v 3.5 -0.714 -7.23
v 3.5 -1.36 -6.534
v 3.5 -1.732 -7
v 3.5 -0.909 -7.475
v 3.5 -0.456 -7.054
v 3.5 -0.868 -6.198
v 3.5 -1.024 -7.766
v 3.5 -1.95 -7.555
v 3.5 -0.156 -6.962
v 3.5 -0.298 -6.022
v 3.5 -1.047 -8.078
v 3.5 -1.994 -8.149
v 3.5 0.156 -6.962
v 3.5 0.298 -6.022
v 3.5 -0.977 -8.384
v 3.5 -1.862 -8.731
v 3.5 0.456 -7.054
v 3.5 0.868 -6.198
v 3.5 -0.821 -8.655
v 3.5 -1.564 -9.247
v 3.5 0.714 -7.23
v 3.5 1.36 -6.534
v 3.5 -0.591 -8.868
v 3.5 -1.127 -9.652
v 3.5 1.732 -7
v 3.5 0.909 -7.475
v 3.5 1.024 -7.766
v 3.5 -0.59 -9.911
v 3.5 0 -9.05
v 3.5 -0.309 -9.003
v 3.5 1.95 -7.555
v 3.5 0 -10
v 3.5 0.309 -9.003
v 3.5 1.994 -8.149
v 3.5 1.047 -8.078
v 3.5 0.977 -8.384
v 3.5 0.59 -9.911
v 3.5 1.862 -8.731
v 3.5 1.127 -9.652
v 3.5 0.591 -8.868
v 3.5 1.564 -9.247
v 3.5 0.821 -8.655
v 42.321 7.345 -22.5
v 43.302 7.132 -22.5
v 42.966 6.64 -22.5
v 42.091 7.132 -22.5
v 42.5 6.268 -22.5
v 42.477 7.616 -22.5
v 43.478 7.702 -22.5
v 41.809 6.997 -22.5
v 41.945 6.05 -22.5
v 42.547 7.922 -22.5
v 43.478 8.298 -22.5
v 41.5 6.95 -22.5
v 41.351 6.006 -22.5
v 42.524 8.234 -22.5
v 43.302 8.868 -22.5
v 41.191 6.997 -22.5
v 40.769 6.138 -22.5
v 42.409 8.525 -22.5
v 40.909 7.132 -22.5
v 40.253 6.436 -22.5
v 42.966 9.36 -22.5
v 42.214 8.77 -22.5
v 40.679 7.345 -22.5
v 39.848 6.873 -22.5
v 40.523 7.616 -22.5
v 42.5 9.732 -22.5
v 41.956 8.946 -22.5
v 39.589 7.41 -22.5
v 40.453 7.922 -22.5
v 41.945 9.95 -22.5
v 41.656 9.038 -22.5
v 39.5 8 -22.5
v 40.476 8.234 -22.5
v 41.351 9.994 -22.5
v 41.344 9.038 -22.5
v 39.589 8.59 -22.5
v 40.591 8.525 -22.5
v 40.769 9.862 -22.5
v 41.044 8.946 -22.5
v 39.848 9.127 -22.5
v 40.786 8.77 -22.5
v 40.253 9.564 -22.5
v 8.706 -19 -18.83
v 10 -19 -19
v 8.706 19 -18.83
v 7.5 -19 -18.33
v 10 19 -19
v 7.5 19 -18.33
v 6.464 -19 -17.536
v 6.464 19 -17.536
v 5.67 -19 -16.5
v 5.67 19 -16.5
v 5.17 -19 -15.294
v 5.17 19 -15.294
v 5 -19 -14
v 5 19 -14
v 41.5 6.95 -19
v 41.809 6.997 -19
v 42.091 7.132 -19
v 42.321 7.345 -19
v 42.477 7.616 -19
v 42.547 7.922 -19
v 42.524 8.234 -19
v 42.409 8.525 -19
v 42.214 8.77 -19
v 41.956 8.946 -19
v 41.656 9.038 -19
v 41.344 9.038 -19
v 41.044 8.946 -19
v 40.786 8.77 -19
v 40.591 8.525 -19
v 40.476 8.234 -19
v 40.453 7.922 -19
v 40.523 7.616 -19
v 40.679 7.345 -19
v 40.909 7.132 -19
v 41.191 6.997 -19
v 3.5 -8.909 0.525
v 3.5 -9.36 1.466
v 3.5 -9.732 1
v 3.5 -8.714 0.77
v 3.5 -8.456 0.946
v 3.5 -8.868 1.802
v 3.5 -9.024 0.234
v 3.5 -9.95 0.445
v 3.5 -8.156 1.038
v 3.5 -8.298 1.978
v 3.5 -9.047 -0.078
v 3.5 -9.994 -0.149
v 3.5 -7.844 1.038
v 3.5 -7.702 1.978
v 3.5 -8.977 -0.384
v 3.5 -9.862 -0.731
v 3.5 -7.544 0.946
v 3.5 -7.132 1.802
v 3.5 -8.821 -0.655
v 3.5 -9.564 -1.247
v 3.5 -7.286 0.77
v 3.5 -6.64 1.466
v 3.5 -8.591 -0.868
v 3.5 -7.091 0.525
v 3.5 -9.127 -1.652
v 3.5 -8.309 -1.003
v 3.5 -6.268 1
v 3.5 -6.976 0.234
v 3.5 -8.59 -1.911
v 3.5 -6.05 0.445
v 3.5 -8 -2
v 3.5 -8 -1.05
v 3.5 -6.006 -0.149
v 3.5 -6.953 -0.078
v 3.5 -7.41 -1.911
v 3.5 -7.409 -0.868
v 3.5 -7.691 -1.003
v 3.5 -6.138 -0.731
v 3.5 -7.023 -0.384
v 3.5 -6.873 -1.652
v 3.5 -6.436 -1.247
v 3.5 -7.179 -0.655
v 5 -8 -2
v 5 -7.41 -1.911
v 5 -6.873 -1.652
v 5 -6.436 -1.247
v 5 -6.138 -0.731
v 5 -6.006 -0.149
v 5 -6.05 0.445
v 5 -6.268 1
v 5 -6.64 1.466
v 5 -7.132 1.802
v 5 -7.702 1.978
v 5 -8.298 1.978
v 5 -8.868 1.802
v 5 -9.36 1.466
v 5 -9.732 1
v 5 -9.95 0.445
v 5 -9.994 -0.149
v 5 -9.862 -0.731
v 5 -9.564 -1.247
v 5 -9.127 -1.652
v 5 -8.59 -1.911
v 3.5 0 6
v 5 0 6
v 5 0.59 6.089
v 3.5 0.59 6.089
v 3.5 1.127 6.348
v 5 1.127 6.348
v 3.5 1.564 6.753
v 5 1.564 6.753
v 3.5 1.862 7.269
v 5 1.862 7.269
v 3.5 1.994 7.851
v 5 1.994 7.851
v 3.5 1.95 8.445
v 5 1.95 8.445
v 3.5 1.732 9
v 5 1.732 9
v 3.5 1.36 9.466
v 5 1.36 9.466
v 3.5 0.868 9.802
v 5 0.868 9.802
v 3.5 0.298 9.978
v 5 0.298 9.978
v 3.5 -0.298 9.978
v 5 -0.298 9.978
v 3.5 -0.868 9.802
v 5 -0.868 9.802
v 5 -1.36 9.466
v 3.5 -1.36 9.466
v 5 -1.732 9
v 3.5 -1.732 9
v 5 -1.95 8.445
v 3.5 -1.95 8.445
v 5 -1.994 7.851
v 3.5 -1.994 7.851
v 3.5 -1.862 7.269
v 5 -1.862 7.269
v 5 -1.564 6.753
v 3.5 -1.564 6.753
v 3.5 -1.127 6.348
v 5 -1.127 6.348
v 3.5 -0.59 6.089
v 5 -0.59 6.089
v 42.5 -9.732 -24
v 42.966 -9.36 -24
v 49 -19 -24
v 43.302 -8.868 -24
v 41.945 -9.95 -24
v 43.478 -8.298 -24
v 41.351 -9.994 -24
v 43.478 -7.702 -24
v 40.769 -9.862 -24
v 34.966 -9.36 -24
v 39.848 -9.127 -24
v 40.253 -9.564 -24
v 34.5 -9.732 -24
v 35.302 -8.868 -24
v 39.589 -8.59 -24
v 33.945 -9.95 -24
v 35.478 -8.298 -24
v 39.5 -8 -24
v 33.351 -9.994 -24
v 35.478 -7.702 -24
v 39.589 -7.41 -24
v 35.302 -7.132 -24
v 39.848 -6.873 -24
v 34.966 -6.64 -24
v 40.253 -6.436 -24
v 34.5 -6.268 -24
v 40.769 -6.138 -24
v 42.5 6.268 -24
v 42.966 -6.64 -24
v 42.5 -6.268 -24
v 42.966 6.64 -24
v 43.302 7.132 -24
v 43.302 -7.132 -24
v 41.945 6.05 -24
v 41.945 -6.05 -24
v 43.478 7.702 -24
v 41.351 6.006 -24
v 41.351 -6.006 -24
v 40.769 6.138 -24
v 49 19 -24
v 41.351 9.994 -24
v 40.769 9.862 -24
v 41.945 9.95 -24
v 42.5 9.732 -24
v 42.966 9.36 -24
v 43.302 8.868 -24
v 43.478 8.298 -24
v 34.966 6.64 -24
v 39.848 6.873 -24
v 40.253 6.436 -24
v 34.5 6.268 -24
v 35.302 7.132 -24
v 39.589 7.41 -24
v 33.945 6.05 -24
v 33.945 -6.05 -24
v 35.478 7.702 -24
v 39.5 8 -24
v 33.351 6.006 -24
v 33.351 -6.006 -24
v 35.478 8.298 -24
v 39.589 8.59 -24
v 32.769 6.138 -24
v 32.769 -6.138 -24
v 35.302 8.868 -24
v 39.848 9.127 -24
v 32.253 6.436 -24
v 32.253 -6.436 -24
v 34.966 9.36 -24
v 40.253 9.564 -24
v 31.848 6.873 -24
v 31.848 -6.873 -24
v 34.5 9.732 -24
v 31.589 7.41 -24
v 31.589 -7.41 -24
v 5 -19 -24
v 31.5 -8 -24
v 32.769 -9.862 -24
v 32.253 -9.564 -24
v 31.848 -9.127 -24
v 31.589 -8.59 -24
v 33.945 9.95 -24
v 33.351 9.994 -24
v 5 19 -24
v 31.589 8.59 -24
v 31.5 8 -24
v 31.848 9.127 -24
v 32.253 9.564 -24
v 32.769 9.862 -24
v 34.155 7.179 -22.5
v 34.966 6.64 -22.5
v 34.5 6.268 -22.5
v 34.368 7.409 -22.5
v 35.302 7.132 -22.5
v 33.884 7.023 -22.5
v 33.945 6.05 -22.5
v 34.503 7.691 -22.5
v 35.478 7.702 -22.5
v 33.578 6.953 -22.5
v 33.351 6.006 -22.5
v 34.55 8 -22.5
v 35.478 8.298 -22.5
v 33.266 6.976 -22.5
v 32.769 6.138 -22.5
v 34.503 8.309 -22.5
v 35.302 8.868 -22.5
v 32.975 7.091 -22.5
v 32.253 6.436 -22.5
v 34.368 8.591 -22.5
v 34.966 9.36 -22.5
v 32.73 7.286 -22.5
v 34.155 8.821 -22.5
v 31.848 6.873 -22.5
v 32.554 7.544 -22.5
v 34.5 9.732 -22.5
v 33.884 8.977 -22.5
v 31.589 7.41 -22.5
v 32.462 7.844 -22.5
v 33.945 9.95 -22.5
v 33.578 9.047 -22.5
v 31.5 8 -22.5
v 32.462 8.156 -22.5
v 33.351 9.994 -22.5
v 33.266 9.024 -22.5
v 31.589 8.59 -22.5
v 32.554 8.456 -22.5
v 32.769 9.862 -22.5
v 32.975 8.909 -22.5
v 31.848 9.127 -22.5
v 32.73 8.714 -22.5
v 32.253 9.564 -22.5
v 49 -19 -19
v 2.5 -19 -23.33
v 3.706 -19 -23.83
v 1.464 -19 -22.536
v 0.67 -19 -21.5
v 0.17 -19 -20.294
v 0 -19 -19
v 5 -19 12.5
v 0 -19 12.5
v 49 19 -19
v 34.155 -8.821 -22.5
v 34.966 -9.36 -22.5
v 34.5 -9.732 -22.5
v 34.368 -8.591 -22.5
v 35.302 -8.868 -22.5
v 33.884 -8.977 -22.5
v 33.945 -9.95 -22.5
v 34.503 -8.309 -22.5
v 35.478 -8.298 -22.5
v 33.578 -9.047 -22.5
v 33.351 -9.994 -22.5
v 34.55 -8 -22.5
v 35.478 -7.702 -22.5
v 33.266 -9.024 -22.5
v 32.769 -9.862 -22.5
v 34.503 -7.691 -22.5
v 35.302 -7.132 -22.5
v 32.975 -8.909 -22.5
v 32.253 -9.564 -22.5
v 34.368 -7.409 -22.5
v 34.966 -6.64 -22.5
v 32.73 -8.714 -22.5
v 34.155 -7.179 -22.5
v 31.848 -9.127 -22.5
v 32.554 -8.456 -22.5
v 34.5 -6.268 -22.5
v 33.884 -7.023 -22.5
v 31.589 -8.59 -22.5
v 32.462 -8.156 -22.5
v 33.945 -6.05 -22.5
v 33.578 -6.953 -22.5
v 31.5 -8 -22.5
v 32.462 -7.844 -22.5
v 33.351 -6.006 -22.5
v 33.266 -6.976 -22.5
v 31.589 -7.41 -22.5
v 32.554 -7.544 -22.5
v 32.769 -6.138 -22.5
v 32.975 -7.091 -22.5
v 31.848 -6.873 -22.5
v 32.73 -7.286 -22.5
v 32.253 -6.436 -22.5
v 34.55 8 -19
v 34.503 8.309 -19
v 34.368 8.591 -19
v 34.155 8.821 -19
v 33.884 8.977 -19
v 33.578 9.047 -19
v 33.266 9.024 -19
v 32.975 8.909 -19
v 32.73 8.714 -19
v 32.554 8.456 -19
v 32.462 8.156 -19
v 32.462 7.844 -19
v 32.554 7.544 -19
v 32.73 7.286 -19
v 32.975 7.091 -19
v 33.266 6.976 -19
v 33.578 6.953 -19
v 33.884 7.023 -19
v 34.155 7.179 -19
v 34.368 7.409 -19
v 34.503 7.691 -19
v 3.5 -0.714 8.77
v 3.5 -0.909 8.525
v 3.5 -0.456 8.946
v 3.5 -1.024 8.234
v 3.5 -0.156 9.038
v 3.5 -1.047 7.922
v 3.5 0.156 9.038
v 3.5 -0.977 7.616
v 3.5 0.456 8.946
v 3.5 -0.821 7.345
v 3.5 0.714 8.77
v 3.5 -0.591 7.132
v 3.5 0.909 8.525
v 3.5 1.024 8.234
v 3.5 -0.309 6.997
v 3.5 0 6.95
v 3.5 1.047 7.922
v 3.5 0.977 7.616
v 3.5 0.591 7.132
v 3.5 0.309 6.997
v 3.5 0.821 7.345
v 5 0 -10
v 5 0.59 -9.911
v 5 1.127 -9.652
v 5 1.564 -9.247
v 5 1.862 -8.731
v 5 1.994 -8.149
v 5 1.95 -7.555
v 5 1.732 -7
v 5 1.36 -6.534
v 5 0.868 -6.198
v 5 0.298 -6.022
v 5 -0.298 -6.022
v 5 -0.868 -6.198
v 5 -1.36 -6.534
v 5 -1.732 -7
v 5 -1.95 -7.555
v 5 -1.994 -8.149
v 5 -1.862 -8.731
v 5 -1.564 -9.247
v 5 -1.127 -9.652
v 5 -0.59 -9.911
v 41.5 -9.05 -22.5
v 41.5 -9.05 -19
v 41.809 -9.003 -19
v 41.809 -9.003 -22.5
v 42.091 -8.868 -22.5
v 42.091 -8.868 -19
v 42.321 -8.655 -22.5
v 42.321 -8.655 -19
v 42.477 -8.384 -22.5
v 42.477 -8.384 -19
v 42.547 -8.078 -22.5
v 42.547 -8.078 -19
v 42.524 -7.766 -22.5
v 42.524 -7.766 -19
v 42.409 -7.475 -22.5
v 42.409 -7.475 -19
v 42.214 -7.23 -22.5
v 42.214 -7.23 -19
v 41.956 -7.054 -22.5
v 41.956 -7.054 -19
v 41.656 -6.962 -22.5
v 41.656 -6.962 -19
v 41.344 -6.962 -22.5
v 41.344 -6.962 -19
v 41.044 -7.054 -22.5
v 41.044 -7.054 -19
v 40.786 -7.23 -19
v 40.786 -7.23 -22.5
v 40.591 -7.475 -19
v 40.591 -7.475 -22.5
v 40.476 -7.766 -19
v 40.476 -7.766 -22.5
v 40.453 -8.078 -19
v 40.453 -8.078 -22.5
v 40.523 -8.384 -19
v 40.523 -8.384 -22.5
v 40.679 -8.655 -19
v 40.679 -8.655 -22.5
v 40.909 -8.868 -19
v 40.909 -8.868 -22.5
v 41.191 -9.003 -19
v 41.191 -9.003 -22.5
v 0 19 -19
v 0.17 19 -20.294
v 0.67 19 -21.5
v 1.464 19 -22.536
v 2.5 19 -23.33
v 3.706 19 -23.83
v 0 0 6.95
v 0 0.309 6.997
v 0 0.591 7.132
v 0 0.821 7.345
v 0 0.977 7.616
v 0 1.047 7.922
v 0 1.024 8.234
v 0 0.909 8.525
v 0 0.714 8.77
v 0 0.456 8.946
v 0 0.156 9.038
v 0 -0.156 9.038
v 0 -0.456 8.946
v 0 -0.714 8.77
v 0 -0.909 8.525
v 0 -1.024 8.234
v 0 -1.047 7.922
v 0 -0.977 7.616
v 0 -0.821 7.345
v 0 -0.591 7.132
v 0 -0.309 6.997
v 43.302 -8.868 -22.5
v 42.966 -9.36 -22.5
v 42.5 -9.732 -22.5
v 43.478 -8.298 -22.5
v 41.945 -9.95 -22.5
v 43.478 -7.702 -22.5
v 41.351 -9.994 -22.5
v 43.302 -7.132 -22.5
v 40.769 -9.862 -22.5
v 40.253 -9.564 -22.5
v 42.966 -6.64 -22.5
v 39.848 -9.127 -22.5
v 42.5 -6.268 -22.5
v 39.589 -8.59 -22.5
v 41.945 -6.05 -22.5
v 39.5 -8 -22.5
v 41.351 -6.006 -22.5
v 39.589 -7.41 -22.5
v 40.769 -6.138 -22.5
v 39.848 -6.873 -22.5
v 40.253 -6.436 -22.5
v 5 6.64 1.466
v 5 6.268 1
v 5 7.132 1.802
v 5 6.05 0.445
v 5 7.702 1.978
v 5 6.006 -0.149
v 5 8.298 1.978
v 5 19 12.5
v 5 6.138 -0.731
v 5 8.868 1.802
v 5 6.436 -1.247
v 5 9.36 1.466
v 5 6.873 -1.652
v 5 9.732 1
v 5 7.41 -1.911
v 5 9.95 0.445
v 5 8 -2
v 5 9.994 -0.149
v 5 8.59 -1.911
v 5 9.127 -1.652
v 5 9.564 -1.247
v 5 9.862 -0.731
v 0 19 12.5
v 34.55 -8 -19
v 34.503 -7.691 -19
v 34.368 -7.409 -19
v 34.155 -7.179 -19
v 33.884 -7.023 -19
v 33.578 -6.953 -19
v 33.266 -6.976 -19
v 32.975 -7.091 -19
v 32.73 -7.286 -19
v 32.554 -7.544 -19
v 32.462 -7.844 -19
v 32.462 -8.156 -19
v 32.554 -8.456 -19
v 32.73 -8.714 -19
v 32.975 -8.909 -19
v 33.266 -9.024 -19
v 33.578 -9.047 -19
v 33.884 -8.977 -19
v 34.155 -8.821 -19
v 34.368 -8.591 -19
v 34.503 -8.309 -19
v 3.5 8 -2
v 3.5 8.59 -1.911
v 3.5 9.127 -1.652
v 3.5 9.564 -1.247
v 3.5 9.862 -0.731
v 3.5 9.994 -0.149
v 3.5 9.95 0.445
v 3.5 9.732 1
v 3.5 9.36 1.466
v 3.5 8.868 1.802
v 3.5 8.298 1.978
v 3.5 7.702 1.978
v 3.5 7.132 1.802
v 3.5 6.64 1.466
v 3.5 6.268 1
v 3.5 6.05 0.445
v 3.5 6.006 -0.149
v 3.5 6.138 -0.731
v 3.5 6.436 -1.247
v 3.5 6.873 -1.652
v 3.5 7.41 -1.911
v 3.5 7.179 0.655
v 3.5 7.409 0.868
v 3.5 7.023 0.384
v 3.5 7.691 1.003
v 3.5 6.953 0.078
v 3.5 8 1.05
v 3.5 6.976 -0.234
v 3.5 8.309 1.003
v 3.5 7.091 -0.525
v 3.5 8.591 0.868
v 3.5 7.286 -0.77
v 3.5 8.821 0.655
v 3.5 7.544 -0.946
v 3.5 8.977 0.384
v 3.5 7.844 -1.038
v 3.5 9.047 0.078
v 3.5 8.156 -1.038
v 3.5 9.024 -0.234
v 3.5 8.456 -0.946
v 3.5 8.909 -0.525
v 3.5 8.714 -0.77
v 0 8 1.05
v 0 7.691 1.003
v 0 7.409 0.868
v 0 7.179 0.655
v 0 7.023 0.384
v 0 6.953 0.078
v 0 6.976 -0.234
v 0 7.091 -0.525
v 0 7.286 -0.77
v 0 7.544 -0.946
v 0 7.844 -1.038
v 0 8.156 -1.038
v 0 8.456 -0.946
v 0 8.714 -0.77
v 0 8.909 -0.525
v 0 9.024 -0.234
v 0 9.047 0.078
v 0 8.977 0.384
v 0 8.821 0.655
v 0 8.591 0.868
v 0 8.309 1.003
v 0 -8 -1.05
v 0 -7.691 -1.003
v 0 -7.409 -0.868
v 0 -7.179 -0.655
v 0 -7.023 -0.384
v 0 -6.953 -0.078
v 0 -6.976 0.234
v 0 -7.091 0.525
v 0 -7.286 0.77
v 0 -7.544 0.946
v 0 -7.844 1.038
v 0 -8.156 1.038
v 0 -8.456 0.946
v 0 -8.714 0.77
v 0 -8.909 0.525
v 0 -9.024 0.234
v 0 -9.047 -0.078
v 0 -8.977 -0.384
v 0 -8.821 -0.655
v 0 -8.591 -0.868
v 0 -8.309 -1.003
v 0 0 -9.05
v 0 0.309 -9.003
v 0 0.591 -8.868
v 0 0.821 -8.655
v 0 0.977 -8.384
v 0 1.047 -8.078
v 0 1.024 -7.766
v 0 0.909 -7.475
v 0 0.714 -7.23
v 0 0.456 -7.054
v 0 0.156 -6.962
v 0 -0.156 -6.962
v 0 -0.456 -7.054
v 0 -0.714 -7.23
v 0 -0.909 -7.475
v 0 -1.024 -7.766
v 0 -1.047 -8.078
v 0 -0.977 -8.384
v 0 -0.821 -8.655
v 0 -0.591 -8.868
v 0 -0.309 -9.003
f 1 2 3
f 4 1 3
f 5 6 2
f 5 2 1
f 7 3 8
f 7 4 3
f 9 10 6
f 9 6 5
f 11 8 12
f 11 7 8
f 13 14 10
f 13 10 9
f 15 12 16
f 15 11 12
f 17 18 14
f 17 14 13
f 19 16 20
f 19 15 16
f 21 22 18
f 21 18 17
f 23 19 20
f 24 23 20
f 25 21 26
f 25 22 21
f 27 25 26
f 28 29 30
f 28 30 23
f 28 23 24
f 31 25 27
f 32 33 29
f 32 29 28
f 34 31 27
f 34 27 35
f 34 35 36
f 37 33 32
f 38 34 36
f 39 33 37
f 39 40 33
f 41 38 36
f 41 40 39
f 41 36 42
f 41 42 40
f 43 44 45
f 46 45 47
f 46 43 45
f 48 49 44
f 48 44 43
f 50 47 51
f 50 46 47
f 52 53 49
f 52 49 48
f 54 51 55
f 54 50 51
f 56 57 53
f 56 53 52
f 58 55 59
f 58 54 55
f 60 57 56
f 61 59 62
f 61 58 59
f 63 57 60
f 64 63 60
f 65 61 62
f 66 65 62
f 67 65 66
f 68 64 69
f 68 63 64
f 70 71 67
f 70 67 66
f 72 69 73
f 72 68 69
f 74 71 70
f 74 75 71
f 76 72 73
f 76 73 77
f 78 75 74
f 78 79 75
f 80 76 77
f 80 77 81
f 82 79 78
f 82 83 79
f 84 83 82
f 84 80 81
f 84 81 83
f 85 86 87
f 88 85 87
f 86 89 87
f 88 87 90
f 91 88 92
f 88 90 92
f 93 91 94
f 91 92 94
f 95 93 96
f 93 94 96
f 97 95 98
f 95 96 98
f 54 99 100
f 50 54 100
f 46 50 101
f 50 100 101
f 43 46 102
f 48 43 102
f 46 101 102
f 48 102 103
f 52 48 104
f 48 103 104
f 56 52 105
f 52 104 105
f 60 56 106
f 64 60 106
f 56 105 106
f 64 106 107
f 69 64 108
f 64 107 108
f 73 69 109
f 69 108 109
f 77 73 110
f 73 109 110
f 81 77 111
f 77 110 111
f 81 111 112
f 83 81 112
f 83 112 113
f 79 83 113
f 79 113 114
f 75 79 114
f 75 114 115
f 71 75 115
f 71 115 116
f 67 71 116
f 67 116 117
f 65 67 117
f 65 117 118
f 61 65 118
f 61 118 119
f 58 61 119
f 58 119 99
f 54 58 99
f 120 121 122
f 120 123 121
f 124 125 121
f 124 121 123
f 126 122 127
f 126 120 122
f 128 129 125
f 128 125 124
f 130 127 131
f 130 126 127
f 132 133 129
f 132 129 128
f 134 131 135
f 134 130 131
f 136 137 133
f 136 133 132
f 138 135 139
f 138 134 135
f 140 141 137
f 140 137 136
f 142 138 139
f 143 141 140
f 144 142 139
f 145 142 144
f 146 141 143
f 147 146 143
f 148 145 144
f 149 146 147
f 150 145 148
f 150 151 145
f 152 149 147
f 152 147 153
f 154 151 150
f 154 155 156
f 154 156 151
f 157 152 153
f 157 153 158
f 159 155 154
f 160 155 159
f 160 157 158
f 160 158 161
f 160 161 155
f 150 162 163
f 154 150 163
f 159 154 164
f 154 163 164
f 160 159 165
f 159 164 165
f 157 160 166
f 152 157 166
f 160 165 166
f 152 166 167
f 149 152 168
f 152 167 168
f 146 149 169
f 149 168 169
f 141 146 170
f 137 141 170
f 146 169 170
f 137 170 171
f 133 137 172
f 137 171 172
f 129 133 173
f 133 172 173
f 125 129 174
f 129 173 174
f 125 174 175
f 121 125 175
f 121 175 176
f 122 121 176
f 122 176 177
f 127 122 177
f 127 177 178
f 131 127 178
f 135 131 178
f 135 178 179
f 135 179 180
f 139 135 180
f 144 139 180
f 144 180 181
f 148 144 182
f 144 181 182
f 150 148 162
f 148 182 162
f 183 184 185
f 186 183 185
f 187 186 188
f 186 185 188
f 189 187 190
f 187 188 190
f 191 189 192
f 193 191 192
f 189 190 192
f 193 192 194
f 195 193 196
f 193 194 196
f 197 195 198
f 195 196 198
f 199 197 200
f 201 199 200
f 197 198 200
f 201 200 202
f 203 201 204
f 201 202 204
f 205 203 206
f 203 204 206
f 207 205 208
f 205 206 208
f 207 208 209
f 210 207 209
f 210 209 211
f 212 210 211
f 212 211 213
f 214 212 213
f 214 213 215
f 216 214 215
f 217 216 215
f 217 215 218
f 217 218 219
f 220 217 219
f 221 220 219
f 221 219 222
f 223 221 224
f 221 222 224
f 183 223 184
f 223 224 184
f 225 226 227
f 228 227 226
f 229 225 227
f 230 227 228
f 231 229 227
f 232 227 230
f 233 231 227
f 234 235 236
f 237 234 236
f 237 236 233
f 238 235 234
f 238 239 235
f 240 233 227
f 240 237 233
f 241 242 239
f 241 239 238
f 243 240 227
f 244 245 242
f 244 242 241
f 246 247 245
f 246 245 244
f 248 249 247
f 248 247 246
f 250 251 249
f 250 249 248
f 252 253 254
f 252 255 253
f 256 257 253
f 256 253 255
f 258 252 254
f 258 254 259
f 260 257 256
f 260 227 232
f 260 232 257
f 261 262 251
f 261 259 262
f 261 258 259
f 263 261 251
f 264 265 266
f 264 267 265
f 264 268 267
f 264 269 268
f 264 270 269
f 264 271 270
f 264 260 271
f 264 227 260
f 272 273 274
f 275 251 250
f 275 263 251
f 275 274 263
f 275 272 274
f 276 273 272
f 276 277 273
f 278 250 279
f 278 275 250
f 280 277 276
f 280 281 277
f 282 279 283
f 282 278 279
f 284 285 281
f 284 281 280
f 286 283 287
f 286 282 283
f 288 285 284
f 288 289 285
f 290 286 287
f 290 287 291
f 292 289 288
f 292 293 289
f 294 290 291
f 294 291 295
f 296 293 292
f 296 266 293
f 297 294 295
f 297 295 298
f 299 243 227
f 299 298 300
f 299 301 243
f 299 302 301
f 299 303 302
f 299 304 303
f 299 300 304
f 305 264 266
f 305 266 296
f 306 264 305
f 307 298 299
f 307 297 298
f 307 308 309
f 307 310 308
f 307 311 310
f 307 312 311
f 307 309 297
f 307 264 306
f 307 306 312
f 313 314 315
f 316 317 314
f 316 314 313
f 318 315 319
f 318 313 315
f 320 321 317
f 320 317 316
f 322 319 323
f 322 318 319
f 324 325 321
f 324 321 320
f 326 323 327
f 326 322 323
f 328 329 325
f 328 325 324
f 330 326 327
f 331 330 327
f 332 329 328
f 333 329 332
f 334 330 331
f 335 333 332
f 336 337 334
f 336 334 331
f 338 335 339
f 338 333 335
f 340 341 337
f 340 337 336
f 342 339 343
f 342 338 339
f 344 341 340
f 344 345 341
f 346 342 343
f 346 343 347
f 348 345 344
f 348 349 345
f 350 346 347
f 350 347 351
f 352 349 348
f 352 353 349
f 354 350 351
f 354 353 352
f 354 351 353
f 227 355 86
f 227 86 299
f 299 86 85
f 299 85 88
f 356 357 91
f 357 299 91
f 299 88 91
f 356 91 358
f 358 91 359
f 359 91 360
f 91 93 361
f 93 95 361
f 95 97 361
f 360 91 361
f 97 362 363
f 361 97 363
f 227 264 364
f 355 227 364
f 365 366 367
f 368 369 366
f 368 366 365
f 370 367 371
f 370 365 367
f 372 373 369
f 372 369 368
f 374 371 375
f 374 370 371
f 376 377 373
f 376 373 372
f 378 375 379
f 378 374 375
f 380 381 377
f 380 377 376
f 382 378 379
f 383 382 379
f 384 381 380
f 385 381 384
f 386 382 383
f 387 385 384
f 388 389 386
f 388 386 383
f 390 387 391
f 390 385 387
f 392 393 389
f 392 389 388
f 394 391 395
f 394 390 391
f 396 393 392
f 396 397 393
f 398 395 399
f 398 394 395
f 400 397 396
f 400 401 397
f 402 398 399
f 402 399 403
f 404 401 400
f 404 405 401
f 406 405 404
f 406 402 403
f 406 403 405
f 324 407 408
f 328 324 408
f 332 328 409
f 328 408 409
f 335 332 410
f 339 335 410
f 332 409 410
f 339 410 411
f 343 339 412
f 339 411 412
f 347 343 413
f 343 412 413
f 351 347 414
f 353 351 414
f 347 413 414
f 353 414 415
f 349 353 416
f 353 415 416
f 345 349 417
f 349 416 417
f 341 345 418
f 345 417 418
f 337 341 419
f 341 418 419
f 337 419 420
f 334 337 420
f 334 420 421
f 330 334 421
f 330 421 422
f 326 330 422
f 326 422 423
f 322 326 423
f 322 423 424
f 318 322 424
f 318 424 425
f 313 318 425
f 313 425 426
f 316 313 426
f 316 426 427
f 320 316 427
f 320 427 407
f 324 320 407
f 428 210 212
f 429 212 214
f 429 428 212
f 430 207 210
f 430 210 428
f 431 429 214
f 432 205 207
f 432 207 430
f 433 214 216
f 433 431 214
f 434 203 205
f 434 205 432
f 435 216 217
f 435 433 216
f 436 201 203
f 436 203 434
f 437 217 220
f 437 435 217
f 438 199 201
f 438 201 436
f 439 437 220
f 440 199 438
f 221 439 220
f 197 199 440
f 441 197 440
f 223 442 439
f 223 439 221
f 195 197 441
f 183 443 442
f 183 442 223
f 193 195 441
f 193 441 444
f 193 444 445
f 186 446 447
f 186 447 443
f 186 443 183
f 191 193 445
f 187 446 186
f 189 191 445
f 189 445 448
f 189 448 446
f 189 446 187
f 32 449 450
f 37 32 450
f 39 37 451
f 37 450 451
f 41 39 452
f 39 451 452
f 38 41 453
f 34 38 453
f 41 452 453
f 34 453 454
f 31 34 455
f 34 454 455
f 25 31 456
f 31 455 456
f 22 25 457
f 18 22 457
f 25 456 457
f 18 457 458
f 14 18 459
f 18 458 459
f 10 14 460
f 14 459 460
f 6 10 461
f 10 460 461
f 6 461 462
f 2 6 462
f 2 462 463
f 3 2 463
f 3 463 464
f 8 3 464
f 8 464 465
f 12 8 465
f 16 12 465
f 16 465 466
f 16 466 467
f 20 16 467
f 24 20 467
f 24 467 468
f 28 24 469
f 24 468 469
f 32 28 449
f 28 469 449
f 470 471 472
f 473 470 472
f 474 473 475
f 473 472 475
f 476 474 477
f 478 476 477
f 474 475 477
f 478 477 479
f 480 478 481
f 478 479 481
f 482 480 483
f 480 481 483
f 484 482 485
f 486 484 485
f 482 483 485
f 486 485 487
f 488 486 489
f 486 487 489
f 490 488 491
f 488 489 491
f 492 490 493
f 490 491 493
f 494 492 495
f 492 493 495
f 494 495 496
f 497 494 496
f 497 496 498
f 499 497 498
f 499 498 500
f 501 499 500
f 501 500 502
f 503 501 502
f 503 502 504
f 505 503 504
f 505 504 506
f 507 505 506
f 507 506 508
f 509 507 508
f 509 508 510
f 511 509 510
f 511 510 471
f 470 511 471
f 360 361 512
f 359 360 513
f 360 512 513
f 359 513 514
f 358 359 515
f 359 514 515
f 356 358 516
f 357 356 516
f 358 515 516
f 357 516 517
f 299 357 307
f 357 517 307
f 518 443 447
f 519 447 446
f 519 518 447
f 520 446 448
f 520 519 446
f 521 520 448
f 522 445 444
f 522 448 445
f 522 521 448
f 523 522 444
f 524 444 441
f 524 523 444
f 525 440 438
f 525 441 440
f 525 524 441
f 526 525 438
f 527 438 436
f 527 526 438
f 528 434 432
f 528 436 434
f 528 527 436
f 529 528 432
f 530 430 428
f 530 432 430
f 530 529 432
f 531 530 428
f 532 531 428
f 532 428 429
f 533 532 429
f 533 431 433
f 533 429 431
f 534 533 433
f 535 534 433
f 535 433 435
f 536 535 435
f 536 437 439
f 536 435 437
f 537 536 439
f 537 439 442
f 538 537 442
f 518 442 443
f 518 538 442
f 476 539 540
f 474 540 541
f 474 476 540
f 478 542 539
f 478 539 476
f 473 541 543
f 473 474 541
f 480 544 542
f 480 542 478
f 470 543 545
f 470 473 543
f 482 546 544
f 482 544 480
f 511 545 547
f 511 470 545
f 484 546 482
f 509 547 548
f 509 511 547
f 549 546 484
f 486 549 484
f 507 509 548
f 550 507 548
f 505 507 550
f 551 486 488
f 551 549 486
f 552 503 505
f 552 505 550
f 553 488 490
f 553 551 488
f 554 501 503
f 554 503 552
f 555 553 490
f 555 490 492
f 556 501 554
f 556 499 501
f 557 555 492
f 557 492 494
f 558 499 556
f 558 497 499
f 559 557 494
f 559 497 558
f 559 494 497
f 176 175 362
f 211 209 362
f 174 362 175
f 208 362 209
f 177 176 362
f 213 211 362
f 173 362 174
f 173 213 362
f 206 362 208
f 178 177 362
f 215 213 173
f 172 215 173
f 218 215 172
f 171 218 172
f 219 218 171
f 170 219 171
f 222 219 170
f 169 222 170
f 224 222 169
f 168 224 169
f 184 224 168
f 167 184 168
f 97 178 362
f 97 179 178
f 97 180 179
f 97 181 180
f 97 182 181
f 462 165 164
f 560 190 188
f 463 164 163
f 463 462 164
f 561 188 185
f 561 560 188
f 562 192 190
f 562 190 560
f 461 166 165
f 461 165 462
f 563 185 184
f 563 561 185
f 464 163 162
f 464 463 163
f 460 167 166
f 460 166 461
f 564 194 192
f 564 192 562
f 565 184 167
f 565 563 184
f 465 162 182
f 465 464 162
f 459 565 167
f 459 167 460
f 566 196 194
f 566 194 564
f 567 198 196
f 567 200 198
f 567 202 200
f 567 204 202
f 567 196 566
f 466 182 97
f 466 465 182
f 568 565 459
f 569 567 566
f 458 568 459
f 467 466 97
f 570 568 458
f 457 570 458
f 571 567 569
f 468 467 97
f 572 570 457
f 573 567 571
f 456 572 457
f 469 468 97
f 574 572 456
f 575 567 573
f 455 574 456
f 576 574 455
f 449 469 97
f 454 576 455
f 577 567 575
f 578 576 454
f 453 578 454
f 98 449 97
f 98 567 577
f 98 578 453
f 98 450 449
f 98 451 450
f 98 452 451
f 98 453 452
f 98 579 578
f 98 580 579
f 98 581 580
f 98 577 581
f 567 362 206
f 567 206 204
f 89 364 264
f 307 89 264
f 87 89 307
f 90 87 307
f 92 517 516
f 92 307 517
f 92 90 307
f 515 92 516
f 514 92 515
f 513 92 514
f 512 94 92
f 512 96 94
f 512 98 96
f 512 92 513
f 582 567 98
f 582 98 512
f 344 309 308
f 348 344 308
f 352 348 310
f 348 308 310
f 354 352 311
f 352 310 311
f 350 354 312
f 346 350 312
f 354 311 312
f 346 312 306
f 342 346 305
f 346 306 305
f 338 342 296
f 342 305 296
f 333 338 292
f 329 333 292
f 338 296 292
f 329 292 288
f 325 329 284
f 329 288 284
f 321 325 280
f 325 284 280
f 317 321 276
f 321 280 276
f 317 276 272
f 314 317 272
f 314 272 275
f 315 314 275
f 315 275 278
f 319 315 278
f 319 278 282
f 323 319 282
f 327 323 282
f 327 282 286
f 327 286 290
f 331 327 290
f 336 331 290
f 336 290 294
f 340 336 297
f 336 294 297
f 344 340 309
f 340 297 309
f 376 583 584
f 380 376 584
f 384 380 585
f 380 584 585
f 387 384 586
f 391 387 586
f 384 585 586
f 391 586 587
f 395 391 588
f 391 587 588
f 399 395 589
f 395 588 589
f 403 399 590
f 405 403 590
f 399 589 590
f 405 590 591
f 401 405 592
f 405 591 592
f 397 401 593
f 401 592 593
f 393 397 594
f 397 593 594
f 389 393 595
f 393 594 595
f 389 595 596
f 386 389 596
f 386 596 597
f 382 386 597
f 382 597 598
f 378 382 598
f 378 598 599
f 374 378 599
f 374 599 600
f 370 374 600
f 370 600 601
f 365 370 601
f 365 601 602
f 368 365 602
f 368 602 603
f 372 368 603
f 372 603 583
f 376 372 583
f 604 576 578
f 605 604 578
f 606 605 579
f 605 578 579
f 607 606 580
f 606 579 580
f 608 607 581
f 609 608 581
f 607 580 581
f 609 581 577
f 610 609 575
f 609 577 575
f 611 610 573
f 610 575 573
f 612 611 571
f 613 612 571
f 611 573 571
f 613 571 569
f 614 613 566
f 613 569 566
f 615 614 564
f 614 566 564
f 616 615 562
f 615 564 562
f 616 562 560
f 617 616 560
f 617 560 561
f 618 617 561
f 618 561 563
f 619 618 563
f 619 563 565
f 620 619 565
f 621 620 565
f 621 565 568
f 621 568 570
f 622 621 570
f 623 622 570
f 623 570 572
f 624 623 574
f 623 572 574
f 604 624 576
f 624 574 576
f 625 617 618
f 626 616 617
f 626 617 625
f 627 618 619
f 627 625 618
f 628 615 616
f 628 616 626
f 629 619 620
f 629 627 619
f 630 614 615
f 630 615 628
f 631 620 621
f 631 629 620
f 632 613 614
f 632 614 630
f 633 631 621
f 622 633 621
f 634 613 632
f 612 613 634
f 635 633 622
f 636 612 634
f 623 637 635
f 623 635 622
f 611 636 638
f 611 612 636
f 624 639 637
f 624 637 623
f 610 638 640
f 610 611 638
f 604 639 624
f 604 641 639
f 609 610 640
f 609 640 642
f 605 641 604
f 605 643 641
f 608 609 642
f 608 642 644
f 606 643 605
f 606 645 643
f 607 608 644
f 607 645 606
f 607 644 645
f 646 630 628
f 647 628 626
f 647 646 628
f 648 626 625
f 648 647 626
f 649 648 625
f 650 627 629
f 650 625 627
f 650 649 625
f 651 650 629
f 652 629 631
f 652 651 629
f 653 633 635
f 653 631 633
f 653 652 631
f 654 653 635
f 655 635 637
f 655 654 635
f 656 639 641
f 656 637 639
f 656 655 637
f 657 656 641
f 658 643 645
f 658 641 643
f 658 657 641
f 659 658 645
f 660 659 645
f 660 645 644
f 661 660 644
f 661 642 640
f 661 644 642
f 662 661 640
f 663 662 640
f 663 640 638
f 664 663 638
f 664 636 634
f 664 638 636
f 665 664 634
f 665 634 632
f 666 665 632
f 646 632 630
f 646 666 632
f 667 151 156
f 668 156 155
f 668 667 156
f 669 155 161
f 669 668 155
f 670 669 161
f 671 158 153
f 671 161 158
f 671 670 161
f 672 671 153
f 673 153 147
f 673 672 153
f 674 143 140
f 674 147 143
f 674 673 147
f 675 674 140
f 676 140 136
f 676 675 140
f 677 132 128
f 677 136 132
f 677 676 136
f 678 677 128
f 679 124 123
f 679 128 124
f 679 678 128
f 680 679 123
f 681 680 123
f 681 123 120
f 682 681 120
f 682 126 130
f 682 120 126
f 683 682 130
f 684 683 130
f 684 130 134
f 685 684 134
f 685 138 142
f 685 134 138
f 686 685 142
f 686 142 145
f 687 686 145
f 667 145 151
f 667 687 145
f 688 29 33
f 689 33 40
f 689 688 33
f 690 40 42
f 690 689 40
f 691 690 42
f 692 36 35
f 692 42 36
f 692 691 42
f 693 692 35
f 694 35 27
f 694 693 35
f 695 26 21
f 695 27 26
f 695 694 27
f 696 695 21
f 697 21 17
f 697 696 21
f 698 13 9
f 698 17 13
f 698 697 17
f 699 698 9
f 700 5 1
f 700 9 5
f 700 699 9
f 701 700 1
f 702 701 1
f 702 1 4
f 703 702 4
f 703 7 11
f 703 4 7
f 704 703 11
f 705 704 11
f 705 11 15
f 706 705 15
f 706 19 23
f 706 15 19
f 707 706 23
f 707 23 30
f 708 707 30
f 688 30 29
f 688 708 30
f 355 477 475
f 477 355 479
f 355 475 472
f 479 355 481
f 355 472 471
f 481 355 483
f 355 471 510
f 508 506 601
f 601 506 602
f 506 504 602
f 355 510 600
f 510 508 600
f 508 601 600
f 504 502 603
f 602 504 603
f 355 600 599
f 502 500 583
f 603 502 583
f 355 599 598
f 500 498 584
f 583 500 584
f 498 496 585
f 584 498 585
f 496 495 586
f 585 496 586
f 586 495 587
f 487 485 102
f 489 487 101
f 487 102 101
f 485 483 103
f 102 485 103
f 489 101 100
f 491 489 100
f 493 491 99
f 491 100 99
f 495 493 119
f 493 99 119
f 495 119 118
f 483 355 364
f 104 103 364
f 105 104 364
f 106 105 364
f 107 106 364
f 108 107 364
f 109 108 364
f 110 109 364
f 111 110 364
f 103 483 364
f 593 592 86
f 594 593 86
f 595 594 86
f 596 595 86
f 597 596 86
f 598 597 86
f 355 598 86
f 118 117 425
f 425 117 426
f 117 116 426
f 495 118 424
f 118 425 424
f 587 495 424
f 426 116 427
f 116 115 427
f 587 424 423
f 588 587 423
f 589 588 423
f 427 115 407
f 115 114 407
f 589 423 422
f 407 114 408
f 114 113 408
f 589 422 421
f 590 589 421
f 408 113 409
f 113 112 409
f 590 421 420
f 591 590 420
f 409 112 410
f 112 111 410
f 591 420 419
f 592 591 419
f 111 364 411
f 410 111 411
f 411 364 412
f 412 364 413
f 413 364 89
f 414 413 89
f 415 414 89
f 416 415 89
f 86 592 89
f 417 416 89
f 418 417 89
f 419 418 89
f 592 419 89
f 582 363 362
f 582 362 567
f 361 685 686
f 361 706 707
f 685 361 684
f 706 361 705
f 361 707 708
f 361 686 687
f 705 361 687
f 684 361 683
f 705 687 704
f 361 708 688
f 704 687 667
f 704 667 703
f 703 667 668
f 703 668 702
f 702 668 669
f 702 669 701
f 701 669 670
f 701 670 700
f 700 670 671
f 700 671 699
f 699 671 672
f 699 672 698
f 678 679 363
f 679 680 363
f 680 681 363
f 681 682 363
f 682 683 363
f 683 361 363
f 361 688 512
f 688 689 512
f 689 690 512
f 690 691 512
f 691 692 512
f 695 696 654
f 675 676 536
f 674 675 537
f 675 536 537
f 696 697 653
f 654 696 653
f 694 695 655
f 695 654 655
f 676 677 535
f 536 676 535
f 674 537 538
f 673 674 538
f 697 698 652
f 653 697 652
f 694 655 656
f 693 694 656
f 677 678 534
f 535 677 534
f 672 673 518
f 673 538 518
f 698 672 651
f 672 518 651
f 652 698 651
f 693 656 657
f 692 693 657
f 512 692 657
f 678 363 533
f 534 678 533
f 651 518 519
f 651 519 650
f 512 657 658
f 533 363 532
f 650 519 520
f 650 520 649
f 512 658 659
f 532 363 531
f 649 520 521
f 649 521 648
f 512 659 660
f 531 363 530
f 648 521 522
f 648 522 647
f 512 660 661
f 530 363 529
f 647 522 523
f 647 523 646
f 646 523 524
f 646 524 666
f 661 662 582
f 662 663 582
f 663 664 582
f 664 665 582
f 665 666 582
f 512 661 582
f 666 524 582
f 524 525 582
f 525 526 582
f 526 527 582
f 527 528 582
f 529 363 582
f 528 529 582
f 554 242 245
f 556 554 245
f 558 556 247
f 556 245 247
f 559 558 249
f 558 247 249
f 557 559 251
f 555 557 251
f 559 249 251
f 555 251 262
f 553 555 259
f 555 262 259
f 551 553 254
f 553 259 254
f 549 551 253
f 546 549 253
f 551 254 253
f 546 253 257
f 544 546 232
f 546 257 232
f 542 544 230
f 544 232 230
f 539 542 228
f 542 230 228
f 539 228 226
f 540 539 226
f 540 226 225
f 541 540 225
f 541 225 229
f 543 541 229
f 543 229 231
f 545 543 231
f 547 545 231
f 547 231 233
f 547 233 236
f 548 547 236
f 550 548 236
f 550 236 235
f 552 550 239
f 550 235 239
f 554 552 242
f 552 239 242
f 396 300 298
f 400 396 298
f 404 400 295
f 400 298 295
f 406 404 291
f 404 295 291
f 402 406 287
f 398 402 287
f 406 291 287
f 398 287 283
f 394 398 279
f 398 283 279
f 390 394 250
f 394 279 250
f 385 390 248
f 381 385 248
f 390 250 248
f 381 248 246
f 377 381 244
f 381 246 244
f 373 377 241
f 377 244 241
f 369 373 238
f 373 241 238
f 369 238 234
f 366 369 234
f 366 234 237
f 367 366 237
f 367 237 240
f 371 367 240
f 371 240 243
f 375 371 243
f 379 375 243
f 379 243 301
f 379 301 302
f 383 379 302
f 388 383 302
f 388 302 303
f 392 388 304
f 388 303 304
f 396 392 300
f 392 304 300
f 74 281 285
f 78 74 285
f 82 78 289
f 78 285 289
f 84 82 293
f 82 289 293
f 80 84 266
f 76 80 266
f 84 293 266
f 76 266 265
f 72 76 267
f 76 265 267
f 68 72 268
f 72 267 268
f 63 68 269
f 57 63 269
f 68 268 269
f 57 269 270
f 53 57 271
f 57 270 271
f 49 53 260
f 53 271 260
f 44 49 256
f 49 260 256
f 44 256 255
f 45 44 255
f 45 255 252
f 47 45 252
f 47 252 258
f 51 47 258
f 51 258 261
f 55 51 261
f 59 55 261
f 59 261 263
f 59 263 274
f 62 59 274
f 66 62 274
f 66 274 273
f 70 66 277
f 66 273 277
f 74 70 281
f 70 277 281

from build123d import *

# Parameters (mm, degrees)
SKETCH1_W           = 31.5
SKETCH1_H           = 38
BOSS_EXTRUDE1_DEPTH = 5
SKETCH3_W           = 64
SKETCH3_H           = 38
BOSS_EXTRUDE3_DEPTH = 5
SKETCH7_R           = 1.05
CUT_EXTRUDE3_DEPTH  = 5
SKETCH8_W           = 10
SKETCH8_H           = 38
CUT_EXTRUDE4_DEPTH  = 10
FILLET1_R           = 5
SKETCH9_R           = 2
CUT_EXTRUDE5_DEPTH  = 1.5
SKETCH11_R          = 2
CUT_EXTRUDE7_DEPTH  = 1.5
CUT_EXTRUDE8_DEPTH  = 39


with BuildPart() as part:
    # Sketch1 → Boss-Extrude1 (new body)
    with BuildSketch(Plane(origin=(0, 0, 0), x_dir=(0, 0, -1), z_dir=(1, 0, 0))):
        with Locations((3.25, 0)):
            Rectangle(SKETCH1_W, SKETCH1_H)
        with BuildLine():
            ThreePointArc((1.05, 8), (0, 9.05), (-1.05, 8))
            ThreePointArc((-1.05, 8), (0, 6.95), (1.05, 8))
        make_face(mode=Mode.SUBTRACT)
        with BuildLine():
            ThreePointArc((6.95, 0), (8, -1.05), (9.05, 0))
            ThreePointArc((9.05, 0), (8, 1.05), (6.95, 0))
        make_face(mode=Mode.SUBTRACT)
        with BuildLine():
            ThreePointArc((-1.05, -8), (0, -9.05), (1.05, -8))
            ThreePointArc((1.05, -8), (0, -6.95), (-1.05, -8))
        make_face(mode=Mode.SUBTRACT)
        with BuildLine():
            ThreePointArc((-9.05, 0), (-8, -1.05), (-6.95, 0))
            ThreePointArc((-6.95, 0), (-8, 1.05), (-9.05, 0))
        make_face(mode=Mode.SUBTRACT)
    extrude(amount=BOSS_EXTRUDE1_DEPTH)

    # Sketch3 → Boss-Extrude3 (add)
    with BuildSketch(Plane(origin=(0, 0, -19), x_dir=(-1, 0, 0), z_dir=(0, 0, -1))):
        with Locations((-32, 0)):
            Rectangle(SKETCH3_W, SKETCH3_H)
    extrude(amount=BOSS_EXTRUDE3_DEPTH)

    # Sketch7 → Cut-Extrude3 (cut)
    with BuildSketch(Plane.XY.offset(-19)):
        with Locations((33.5, 8)):
            Circle(SKETCH7_R)
        with Locations((33.5, -8)):
            Circle(SKETCH7_R)
        with BuildLine():
            ThreePointArc((41.5, -6.95), (40.45, -8), (41.5, -9.05))
            ThreePointArc((41.5, -9.05), (42.55, -8), (41.5, -6.95))
        make_face()
        with BuildLine():
            ThreePointArc((41.5, 9.05), (40.45, 8), (41.5, 6.95))
            ThreePointArc((41.5, 6.95), (42.55, 8), (41.5, 9.05))
        make_face()
    extrude(amount=-CUT_EXTRUDE3_DEPTH, mode=Mode.SUBTRACT)

    # Sketch8 → Cut-Extrude4 (cut)
    with BuildSketch(Plane(origin=(0, 0, -24), x_dir=(-1, 0, 0), z_dir=(0, 0, -1))):
        with Locations((-59, 0)):
            Rectangle(SKETCH8_W, SKETCH8_H)
    extrude(amount=-CUT_EXTRUDE4_DEPTH, mode=Mode.SUBTRACT)

    # Fillet1
    fillet1_edges = [part.edges().sort_by_distance(p)[0] for p in [
        (0, 0, -24),
        (5, 0, -19),
    ]]
    fillet(fillet1_edges, radius=FILLET1_R)

    # Sketch9 → Cut-Extrude5 (cut)
    with BuildSketch(Plane(origin=(0, 0, -24), x_dir=(-1, 0, 0), z_dir=(0, 0, -1))):
        with Locations((-41.5, 8)):
            Circle(SKETCH9_R)
        with Locations((-41.5, -8)):
            Circle(SKETCH9_R)
        with Locations((-33.5, 8)):
            Circle(SKETCH9_R)
        with Locations((-33.5, -8)):
            Circle(SKETCH9_R)
    extrude(amount=-CUT_EXTRUDE5_DEPTH, mode=Mode.SUBTRACT)

    # Sketch11 → Cut-Extrude7 (cut)
    with BuildSketch(Plane(origin=(5, 0, 0), x_dir=(0, 0, -1), z_dir=(1, 0, 0))):
        with Locations((0, 8)):
            Circle(SKETCH11_R)
        with Locations((-8, 0)):
            Circle(SKETCH11_R)
        with Locations((0, -8)):
            Circle(SKETCH11_R)
        with Locations((8, 0)):
            Circle(SKETCH11_R)
    extrude(amount=-CUT_EXTRUDE7_DEPTH, mode=Mode.SUBTRACT)

    # Sketch12 → Cut-Extrude8 (cut, through all)
    with BuildSketch(Plane(origin=(0, 19, 0), x_dir=(1, 0, 0), z_dir=(0, 1, 0))):
        Polygon((54, 24), (49, 24), (49, 17.432960287), (56.636110038, 15.929403626), (56.327583627, 23.530489308), align=None)
    extrude(amount=-CUT_EXTRUDE8_DEPTH, mode=Mode.SUBTRACT)


solid = part.part
